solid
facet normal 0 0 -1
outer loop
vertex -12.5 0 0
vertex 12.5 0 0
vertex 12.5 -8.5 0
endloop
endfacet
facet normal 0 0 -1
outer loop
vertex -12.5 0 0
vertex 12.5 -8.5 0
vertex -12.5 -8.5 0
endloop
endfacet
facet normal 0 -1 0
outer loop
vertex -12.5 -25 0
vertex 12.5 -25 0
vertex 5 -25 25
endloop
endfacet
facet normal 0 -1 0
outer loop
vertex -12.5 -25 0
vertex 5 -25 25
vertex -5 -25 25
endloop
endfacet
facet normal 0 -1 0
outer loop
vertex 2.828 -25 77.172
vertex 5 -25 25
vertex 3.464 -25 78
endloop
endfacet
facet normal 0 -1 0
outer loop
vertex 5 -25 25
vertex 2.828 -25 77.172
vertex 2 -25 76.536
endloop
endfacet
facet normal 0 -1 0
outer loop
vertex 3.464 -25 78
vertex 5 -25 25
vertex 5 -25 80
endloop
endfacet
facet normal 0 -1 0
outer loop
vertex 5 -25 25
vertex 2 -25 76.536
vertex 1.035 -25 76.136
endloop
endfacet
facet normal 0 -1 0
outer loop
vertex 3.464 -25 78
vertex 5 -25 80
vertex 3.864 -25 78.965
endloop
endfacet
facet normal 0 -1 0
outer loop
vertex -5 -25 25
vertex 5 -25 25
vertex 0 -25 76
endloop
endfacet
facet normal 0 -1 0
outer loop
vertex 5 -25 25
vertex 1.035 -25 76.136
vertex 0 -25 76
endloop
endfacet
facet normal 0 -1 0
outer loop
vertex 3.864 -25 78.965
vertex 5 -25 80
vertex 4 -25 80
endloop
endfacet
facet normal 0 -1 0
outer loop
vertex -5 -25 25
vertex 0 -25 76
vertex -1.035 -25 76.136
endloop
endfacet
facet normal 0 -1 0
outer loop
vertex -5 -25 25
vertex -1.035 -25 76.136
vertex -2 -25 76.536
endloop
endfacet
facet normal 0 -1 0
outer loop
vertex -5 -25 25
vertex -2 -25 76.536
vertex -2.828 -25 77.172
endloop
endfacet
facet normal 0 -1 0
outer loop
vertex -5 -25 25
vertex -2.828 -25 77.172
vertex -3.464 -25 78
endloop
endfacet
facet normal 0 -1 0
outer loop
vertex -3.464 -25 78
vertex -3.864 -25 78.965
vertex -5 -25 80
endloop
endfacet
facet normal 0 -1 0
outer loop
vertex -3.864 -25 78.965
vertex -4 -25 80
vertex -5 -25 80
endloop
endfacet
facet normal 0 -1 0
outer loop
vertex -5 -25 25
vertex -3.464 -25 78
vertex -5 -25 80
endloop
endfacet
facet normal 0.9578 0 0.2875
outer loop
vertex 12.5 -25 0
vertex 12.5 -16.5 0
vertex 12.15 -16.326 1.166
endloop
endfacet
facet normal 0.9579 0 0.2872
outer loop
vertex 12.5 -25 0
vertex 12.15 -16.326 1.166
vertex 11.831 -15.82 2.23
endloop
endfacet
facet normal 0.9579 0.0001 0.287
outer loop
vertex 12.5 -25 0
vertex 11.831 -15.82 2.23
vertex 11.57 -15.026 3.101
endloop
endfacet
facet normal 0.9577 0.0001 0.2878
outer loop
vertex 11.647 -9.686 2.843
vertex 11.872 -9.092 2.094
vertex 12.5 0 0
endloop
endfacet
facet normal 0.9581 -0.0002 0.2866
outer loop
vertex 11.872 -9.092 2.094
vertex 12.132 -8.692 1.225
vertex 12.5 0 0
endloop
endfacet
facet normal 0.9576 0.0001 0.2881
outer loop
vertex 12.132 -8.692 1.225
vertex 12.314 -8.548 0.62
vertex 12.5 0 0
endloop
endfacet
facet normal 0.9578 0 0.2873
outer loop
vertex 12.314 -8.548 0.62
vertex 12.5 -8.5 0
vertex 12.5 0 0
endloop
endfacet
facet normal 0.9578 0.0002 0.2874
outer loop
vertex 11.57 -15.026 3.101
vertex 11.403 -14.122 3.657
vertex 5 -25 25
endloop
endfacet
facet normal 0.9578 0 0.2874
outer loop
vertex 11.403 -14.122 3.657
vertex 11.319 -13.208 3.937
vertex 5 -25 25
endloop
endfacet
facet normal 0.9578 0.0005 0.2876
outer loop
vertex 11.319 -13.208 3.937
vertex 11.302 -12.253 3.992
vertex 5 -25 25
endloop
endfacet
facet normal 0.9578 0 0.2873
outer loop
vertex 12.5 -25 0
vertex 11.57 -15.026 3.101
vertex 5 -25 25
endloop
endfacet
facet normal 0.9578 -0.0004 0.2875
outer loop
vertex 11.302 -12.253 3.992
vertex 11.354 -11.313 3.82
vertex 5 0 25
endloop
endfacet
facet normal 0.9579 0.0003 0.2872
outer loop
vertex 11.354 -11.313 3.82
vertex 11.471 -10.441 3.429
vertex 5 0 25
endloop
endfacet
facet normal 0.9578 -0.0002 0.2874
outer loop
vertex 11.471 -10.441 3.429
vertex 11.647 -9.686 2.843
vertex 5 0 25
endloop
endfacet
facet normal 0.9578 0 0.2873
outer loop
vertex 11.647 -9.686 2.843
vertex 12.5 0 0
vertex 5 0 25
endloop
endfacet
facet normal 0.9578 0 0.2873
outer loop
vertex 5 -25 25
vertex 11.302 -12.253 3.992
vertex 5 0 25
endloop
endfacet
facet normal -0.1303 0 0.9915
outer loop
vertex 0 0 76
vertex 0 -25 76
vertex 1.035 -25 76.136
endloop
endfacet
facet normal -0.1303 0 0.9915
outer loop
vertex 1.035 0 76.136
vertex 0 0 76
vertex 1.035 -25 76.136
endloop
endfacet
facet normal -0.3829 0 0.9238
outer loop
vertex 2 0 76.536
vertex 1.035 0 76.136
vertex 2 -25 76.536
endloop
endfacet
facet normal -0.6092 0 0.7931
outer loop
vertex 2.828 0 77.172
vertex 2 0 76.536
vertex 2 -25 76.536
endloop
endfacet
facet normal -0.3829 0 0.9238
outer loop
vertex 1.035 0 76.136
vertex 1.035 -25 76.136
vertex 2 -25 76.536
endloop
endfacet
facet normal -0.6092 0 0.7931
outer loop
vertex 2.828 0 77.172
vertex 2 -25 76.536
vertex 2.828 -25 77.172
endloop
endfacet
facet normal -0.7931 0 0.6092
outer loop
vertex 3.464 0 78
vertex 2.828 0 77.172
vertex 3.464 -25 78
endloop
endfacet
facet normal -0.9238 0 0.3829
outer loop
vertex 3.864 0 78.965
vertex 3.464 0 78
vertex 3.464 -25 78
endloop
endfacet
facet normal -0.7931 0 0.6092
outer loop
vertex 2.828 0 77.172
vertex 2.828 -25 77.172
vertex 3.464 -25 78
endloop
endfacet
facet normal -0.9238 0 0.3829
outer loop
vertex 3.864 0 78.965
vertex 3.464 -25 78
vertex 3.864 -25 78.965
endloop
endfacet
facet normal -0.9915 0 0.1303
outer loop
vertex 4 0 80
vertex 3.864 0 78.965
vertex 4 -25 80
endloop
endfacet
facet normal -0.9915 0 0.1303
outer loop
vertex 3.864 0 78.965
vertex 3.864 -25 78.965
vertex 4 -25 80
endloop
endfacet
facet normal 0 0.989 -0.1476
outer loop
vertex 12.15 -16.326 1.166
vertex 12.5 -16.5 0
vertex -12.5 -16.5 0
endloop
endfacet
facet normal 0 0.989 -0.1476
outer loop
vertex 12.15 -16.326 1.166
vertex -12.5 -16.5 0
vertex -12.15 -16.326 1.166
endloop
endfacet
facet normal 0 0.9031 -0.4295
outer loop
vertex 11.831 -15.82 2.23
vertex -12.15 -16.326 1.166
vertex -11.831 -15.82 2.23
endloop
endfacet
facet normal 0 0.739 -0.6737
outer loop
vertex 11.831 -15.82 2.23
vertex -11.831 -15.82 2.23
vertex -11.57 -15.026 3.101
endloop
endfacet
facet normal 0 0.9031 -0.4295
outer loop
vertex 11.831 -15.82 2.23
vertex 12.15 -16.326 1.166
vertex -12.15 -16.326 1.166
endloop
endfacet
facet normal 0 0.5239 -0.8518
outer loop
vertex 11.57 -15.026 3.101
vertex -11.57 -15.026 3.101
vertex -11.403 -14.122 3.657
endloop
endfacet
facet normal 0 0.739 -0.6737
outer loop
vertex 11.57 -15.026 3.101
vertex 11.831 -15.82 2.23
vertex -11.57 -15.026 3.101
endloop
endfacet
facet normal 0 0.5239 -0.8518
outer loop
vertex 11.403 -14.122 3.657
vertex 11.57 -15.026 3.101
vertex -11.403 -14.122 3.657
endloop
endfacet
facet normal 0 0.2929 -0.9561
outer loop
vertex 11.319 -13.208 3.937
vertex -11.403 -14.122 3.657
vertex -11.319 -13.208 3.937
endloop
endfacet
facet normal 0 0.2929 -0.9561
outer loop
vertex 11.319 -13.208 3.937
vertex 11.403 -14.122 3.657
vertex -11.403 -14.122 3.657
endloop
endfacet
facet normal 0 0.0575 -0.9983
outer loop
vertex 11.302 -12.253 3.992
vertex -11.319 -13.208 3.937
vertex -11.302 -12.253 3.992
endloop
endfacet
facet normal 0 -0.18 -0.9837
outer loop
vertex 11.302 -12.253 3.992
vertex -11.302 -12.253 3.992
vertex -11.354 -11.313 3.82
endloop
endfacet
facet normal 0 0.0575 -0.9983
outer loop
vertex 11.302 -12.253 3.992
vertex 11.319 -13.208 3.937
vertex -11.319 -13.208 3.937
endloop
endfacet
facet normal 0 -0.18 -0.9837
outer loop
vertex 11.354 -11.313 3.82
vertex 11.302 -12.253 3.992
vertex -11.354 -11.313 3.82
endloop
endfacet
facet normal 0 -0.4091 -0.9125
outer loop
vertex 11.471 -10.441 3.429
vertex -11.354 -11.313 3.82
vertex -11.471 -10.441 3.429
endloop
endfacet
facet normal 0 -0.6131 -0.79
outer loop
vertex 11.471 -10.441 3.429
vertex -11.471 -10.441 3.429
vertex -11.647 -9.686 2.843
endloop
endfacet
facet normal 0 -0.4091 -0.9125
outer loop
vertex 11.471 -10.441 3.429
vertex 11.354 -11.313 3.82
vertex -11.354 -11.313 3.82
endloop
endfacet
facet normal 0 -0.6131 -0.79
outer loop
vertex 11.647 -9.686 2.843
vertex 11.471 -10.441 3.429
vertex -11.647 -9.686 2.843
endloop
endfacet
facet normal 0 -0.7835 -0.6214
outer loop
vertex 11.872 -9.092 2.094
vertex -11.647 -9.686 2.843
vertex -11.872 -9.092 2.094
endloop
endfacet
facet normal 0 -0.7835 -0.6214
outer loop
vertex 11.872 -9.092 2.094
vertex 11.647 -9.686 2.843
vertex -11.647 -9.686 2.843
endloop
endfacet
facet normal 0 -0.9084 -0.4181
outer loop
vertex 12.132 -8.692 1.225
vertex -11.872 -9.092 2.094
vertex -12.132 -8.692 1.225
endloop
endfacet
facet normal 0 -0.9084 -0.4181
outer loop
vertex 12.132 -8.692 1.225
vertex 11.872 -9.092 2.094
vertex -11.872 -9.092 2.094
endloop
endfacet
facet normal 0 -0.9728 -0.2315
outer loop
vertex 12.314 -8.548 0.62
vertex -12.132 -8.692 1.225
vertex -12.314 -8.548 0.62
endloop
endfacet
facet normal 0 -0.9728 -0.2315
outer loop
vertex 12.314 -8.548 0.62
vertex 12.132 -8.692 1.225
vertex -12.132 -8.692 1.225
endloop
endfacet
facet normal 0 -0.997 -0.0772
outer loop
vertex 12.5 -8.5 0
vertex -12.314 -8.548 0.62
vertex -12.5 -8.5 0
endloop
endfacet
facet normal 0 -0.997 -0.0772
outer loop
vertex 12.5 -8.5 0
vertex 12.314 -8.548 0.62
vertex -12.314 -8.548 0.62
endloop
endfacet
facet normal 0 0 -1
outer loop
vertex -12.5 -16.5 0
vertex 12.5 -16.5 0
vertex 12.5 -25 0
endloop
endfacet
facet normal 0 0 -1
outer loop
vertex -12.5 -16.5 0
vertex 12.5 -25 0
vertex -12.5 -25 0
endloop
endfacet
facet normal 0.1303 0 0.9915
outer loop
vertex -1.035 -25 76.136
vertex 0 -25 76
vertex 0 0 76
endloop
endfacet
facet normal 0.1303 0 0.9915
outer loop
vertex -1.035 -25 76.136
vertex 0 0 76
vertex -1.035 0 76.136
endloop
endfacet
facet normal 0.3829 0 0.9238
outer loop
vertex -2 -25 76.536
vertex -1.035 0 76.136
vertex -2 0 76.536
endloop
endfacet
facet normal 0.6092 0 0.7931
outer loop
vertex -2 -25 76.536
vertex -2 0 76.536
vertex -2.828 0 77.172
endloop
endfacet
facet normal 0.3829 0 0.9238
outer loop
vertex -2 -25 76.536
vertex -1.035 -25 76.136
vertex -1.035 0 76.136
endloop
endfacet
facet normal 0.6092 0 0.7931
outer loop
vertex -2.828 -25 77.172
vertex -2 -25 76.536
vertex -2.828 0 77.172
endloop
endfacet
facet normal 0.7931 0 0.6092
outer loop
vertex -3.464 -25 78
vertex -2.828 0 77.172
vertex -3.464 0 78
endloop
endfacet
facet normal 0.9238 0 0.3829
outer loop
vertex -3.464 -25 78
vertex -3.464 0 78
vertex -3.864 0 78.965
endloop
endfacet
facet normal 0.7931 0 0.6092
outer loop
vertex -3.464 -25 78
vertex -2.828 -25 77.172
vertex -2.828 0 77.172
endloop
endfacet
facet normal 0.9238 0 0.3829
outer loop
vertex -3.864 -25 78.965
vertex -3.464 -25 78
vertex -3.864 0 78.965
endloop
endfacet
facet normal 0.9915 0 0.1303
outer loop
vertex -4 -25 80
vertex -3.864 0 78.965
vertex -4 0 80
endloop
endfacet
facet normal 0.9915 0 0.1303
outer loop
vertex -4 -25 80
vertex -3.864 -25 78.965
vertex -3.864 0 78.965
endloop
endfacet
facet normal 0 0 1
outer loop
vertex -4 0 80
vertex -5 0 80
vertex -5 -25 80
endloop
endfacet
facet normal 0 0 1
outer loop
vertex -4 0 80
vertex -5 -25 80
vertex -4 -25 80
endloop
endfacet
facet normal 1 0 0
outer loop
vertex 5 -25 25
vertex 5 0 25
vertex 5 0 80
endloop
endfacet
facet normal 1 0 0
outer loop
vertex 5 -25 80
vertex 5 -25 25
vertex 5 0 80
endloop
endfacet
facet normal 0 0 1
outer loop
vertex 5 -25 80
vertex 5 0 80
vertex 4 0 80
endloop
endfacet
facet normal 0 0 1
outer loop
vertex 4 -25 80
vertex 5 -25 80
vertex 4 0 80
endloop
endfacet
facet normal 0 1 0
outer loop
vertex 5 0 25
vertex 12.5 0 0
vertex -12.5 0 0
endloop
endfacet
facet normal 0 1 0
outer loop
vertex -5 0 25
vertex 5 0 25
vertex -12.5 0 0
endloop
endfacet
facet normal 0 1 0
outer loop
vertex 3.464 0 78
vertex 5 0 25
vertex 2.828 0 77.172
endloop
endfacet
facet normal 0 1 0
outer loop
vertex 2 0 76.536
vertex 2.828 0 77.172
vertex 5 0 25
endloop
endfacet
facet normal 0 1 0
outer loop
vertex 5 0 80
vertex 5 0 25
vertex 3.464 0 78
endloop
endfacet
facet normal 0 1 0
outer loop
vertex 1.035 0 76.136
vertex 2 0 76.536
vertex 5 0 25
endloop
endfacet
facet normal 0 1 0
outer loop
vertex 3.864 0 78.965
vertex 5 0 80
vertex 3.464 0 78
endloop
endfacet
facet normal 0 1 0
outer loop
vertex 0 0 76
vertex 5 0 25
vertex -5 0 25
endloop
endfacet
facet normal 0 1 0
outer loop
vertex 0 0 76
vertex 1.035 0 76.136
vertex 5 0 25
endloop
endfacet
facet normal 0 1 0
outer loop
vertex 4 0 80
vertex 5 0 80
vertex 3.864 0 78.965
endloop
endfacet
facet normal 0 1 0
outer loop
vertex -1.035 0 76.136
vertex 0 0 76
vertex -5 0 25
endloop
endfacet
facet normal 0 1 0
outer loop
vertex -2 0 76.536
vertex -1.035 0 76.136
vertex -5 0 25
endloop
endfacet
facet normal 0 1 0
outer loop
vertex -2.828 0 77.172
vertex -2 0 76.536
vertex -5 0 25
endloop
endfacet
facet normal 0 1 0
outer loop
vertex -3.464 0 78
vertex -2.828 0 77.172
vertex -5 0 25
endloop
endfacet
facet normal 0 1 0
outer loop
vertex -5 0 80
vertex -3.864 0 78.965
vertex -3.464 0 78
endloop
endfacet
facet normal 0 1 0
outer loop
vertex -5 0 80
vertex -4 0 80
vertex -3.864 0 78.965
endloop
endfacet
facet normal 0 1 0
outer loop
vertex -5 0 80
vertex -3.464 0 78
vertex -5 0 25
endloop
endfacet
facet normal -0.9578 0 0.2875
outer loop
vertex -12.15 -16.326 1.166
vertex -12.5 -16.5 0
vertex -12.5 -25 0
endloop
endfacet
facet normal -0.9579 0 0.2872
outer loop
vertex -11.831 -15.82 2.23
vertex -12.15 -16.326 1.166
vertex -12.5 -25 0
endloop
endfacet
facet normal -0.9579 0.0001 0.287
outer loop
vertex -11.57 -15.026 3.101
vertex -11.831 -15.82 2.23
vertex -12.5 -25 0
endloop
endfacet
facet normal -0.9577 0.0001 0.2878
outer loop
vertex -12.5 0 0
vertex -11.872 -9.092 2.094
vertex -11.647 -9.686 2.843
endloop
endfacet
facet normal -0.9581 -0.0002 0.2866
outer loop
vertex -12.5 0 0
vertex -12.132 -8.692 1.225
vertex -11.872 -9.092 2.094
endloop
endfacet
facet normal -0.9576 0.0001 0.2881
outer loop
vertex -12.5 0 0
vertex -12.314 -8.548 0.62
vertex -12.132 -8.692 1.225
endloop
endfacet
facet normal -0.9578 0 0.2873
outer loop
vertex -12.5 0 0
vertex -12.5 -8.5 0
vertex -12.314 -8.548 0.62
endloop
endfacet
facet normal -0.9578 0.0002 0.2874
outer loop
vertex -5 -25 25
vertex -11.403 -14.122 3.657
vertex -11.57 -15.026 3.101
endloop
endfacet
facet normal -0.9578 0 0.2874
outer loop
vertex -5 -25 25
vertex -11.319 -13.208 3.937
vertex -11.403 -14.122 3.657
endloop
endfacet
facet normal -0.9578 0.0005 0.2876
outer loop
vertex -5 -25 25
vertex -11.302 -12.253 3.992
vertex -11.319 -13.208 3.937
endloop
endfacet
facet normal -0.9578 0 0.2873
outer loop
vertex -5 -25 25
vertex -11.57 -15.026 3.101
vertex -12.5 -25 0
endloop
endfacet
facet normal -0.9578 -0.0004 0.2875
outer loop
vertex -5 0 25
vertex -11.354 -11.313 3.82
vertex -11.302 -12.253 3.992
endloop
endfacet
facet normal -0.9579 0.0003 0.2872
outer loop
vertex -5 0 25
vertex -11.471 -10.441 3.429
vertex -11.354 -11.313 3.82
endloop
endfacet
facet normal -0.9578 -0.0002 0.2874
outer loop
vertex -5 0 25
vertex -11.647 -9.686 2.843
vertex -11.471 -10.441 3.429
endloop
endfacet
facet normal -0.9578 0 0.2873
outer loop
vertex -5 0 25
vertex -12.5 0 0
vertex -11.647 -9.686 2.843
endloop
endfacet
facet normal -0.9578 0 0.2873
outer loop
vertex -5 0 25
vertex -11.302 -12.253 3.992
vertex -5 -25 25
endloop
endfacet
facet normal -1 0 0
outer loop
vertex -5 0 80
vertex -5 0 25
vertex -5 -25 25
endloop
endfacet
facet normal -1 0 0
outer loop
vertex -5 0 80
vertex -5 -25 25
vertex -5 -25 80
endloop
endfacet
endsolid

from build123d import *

# Parameters (mm, degrees)
F1_DEPTH = 25
F4_DEPTH = 30
F5_DEPTH = 15


with BuildPart() as f1:
    # F0 (on Front) → F1 (new body)
    with BuildSketch(Plane.XZ):
        Polygon((0, 80), (0, 0), (12.5, 0), (5, 25), (5, 80), align=None)
    extrude(amount=F1_DEPTH)

    # F3 (on face) → F4 (cut)
    with BuildSketch(Plane.XZ.offset(25)):
        with BuildLine():
            ThreePointArc((0, 76), (2.828427, 77.171573), (4, 80))
            Line((4, 80), (0, 80))
            Line((0, 80), (0, 76))
        make_face()
    extrude(amount=-F4_DEPTH, mode=Mode.SUBTRACT)

    # F2 (on face) → F5 (cut)
    with BuildSketch(Plane(origin=(0, 0, 0), x_dir=(0, -1, 0), z_dir=(-1, 0, 0))):
        with BuildLine():
            Line((8.5, 0), (16.5, 0))
            ThreePointArc((16.5, 0), (12.5, 4), (8.5, 0))
        make_face()
    extrude(amount=-F5_DEPTH, mode=Mode.SUBTRACT)

    # F6: F1 across plane


with BuildPart() as f1_1:
    add(f1.part)
    add(f1.part.mirror(Plane.YZ))


solid = f1_1.part
